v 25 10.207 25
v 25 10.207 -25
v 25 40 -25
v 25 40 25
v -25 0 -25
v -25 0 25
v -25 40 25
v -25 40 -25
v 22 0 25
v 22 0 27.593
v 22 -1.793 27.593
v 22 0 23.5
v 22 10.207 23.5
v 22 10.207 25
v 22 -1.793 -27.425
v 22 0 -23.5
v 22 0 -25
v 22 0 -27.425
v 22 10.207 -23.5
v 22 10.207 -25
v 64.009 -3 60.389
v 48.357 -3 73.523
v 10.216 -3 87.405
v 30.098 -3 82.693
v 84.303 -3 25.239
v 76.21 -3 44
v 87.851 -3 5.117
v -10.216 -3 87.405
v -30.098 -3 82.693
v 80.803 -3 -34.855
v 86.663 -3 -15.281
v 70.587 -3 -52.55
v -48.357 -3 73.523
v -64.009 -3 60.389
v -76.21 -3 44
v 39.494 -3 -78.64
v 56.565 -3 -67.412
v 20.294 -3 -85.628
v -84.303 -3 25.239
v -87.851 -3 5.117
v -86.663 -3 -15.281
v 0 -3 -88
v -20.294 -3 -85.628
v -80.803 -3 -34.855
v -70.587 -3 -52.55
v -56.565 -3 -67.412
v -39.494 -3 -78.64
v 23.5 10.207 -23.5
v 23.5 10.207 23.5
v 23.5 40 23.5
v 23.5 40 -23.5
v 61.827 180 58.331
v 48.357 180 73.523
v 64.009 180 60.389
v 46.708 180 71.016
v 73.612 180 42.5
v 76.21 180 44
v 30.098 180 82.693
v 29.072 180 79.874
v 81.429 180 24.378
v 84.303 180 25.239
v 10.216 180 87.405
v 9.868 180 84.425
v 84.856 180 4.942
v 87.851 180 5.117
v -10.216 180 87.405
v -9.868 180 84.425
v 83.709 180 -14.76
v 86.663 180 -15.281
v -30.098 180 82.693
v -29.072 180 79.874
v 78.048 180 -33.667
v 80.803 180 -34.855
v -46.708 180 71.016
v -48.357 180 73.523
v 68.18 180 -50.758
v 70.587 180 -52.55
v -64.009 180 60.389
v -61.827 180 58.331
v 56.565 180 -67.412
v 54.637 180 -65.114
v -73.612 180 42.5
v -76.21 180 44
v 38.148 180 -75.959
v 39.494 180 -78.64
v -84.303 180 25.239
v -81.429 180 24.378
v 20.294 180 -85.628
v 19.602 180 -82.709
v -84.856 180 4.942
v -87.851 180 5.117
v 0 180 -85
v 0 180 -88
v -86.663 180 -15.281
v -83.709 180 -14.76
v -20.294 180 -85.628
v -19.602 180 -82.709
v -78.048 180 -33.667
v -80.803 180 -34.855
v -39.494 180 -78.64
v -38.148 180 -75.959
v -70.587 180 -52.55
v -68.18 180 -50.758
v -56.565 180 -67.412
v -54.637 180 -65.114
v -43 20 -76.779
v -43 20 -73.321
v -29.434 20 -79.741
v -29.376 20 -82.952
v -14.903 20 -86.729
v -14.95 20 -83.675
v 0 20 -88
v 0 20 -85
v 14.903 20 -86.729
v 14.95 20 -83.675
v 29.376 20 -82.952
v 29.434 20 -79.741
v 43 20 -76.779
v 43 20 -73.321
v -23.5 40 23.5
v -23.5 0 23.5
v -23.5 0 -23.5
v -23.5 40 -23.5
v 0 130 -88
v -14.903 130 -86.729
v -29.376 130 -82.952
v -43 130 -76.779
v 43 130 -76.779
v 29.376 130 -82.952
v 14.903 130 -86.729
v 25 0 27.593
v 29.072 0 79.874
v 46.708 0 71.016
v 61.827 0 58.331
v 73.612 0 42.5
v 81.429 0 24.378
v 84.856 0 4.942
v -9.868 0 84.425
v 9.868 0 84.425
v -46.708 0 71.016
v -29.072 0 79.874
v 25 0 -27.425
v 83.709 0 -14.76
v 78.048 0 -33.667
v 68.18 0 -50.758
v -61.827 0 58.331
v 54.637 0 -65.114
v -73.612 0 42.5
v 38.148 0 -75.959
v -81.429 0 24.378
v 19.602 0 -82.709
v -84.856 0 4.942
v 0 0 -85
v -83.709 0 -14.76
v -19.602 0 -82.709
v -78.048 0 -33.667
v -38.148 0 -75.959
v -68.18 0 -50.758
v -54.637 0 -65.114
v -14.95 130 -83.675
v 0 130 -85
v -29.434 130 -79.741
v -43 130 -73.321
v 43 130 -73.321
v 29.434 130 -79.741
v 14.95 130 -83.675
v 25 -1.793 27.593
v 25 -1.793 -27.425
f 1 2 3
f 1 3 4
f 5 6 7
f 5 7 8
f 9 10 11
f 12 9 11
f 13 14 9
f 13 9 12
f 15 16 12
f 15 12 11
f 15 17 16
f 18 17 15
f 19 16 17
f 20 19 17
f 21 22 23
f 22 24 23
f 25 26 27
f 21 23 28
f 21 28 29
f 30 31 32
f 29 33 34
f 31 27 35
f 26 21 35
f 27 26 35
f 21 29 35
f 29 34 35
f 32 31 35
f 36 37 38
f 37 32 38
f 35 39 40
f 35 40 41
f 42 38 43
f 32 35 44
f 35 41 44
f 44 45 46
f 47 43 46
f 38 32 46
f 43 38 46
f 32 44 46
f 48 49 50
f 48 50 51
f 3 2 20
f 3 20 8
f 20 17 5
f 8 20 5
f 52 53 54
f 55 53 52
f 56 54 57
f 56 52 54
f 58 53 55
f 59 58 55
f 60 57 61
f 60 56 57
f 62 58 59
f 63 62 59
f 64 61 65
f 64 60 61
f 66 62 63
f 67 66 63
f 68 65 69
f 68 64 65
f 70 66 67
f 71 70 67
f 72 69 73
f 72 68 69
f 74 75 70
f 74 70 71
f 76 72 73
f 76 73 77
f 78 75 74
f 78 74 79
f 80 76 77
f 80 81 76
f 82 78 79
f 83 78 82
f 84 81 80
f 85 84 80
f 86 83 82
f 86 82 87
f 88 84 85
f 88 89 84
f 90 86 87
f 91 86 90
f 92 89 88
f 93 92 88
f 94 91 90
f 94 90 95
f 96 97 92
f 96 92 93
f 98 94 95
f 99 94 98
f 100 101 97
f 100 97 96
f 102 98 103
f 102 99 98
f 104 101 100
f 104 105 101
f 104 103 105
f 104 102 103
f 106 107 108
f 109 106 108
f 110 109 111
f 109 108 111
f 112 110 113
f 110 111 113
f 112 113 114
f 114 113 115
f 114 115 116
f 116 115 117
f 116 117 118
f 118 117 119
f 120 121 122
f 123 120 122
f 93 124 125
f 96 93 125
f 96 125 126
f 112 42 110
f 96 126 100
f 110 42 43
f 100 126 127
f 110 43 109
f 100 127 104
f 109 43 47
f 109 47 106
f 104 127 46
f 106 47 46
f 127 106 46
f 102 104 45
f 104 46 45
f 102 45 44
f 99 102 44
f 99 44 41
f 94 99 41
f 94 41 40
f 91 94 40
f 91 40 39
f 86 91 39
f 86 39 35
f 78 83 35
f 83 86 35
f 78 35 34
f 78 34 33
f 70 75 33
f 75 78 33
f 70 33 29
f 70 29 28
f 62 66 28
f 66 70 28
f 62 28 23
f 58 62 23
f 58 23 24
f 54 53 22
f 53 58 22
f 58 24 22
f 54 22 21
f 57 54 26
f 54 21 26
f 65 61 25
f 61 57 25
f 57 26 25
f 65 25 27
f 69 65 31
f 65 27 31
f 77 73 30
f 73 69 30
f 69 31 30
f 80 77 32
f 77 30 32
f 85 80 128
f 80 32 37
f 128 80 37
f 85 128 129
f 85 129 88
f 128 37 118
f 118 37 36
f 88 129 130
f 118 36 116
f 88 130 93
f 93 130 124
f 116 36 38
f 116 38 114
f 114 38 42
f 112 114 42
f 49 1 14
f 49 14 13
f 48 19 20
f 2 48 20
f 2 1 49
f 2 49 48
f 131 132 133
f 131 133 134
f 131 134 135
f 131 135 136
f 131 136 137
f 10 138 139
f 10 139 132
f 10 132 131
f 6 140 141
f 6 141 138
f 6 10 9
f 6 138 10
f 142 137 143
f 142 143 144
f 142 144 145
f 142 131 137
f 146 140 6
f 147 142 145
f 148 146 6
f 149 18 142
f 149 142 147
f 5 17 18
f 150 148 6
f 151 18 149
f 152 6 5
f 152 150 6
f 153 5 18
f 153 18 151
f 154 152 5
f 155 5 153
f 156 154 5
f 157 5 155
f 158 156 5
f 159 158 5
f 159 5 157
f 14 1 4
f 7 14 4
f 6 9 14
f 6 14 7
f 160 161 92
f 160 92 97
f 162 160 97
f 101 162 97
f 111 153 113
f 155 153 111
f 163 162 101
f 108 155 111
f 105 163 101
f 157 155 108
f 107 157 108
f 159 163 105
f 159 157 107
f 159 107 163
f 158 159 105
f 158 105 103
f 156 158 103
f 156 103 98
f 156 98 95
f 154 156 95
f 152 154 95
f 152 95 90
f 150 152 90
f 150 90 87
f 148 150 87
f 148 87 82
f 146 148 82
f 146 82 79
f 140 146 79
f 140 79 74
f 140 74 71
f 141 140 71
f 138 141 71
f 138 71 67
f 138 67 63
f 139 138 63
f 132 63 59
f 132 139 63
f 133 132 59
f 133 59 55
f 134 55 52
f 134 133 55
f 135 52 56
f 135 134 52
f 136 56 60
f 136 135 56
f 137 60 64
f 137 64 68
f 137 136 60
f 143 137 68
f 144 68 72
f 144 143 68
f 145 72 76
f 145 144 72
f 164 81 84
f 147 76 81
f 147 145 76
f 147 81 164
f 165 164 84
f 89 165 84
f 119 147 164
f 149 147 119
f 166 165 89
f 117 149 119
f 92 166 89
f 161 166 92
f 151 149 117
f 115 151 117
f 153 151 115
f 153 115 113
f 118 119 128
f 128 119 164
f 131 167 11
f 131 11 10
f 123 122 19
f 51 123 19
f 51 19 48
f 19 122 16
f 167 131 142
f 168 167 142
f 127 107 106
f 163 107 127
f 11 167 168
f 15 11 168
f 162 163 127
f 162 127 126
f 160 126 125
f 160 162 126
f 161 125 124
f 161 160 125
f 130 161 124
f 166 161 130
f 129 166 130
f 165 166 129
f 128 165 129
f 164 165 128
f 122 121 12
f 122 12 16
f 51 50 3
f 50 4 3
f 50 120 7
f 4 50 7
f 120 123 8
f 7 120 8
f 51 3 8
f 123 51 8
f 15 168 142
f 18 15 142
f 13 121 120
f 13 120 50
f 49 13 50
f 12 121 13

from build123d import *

# Parameters (mm, degrees)
SKETCH_1_R          = 85
EXTRUDE_1_DEPTH     = 180
SHELL_1_T           = 3
SKETCH_2_W          = 86
SKETCH_2_H          = 110
CUT_EXTRUDE_1_DEPTH = 180
SKETCH_3_W          = 47
SKETCH_3_H          = 47
EXTRUDE_2_DEPTH     = 40
SKETCH_4_W          = 55.017876713
SKETCH_4_H          = 12
CUT_EXTRUDE_3_DEPTH = 3


with BuildPart() as part:
    # 草图1 → 凸台-拉伸1 (new body)
    with BuildSketch(Plane(origin=(0, 0, 0), x_dir=(1, 0, 0), z_dir=(0, 1, 0))):
        with Locations(Location((0, 0, 0), (0, 0, 90))):
            Circle(SKETCH_1_R)
    extrude(amount=EXTRUDE_1_DEPTH)

    # 抽壳1
    shell_1_openings = [part.faces().sort_by_distance(p)[0] for p in [
        (0, 180, 0),
    ]]
    offset(amount=SHELL_1_T, openings=shell_1_openings, kind=Kind.INTERSECTION)

    # 草图2 → 切除-拉伸1 (cut)
    with BuildSketch(Plane.XY):
        with Locations((0, 75)):
            Rectangle(SKETCH_2_W, SKETCH_2_H)
    extrude(amount=-CUT_EXTRUDE_1_DEPTH, mode=Mode.SUBTRACT)

    # 草图3 → 凸台-拉伸2 (add)
    with BuildSketch(Plane(origin=(0, 0, 0), x_dir=(1, 0, 0), z_dir=(0, 1, 0))):
        Polygon((0, 25), (25, 25), (25, -25), (-25, -25), (-25, 25), align=None)
        Rectangle(SKETCH_3_W, SKETCH_3_H, mode=Mode.SUBTRACT)
    extrude(amount=EXTRUDE_2_DEPTH)

    # 草图4 → 切除-拉伸3 (cut)
    with BuildSketch(Plane(origin=(25, 0, 0), x_dir=(0, 0, -1), z_dir=(1, 0, 0))):
        with Locations((-0.083732348, 4.206538913)):
            Rectangle(SKETCH_4_W, SKETCH_4_H)
    extrude(amount=-CUT_EXTRUDE_3_DEPTH, mode=Mode.SUBTRACT)


solid = part.part
